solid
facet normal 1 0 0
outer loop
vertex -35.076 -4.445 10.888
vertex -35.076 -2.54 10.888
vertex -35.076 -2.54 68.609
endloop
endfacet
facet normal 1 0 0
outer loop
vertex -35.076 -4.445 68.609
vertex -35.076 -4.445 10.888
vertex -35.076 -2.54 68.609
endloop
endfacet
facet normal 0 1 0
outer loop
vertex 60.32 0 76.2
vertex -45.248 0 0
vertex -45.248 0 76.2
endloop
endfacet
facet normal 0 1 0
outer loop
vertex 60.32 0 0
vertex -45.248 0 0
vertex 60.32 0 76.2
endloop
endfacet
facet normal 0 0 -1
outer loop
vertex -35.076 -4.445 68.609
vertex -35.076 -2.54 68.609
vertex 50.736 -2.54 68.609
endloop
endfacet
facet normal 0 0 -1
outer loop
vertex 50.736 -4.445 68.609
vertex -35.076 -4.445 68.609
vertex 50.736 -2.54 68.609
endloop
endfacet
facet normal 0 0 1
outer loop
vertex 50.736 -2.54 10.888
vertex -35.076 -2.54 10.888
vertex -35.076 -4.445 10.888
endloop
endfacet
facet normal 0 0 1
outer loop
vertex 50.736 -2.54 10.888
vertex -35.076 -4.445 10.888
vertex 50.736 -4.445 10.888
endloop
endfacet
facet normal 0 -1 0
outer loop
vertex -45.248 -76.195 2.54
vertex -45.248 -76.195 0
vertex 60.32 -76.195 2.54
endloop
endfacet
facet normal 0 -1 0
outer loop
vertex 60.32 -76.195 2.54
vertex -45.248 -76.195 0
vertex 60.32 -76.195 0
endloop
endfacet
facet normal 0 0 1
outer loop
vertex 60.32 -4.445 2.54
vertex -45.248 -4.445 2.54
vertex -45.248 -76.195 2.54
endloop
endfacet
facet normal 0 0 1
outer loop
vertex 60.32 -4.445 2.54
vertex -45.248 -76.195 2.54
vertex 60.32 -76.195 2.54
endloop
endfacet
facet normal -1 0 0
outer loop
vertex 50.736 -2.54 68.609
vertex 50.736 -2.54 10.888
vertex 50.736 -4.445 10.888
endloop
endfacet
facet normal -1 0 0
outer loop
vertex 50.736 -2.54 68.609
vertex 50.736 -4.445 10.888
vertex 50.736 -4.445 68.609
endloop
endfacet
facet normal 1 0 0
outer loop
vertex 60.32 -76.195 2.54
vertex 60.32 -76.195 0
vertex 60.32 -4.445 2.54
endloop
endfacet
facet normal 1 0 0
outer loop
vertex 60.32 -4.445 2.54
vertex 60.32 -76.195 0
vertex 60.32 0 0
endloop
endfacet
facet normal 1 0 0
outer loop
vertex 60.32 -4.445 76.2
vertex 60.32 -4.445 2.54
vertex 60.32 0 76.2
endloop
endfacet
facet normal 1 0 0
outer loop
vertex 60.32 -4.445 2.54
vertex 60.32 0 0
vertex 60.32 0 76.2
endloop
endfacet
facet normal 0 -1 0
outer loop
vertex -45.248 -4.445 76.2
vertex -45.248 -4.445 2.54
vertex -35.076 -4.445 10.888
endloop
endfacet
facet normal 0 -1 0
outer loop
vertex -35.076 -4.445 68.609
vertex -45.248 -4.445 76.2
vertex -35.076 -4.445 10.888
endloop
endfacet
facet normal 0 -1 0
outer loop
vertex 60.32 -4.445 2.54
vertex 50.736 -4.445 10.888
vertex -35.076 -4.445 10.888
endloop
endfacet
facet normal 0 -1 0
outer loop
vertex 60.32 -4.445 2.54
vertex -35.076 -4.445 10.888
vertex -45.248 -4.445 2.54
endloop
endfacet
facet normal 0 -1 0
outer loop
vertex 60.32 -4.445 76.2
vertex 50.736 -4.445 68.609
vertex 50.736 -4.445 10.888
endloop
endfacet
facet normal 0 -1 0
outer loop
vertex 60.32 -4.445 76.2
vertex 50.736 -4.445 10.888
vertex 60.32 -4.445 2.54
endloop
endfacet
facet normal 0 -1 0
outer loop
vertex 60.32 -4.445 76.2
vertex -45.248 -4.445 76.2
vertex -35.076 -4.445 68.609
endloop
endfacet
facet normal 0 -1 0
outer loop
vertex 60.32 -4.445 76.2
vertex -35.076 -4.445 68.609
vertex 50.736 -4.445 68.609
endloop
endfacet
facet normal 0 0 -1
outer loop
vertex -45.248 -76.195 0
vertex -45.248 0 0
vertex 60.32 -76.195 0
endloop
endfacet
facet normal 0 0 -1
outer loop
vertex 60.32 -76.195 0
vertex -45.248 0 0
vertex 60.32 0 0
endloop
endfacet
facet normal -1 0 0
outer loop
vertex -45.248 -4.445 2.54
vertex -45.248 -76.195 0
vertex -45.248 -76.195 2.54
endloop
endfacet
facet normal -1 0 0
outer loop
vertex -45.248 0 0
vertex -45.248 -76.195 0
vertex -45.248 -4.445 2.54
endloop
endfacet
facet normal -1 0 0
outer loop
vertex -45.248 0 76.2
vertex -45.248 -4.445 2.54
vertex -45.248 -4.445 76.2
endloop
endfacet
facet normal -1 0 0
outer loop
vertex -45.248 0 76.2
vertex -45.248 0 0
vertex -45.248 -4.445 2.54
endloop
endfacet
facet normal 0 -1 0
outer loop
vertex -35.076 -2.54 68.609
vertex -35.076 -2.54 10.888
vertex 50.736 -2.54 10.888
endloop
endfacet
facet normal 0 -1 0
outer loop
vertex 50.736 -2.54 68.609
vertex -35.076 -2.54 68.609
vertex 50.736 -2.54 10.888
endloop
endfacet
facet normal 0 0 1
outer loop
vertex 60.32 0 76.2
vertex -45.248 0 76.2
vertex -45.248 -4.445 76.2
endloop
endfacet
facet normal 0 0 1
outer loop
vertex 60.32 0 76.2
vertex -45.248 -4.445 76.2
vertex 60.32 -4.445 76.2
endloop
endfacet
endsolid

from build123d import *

# Parameters (mm, degrees)
F0_W     = 105.567920953
F0_H     = 76.1951208115
F1_DEPTH = 76.2
F2_T     = -2.54
F3_W     = 105.567920953
F3_H     = 73.66
F3_W_2   = 85.8121328056
F3_H_2   = 57.7212069184
F4_DEPTH = 1.905


with BuildPart() as f1:
    # F0 (on Top) → F1 (new body)
    with BuildSketch(Plane.XY):
        with Locations((7.5357314199, -38.0975604057)):
            Rectangle(F0_W, F0_H)
    extrude(amount=F1_DEPTH)

    # F2
    f2_openings = [f1.faces().sort_by_distance(p)[0] for p in [
        (7.535731, -38.09756, 76.2),
        (7.535731, -76.195121, 38.1),
        (-45.248229, -38.09756, 38.1),
        (60.319692, -38.09756, 38.1),
    ]]
    offset(amount=F2_T, openings=f2_openings)

    # F3 (on face) → F4 (join)
    with BuildSketch(Plane.XZ.offset(2.54)):
        with Locations((7.5357314199, 39.37)):
            Rectangle(F3_W, F3_H)
        with Locations((7.8303422779, 39.7484777495)):
            Rectangle(F3_W_2, F3_H_2, mode=Mode.SUBTRACT)
    extrude(amount=F4_DEPTH)


solid = f1.part
